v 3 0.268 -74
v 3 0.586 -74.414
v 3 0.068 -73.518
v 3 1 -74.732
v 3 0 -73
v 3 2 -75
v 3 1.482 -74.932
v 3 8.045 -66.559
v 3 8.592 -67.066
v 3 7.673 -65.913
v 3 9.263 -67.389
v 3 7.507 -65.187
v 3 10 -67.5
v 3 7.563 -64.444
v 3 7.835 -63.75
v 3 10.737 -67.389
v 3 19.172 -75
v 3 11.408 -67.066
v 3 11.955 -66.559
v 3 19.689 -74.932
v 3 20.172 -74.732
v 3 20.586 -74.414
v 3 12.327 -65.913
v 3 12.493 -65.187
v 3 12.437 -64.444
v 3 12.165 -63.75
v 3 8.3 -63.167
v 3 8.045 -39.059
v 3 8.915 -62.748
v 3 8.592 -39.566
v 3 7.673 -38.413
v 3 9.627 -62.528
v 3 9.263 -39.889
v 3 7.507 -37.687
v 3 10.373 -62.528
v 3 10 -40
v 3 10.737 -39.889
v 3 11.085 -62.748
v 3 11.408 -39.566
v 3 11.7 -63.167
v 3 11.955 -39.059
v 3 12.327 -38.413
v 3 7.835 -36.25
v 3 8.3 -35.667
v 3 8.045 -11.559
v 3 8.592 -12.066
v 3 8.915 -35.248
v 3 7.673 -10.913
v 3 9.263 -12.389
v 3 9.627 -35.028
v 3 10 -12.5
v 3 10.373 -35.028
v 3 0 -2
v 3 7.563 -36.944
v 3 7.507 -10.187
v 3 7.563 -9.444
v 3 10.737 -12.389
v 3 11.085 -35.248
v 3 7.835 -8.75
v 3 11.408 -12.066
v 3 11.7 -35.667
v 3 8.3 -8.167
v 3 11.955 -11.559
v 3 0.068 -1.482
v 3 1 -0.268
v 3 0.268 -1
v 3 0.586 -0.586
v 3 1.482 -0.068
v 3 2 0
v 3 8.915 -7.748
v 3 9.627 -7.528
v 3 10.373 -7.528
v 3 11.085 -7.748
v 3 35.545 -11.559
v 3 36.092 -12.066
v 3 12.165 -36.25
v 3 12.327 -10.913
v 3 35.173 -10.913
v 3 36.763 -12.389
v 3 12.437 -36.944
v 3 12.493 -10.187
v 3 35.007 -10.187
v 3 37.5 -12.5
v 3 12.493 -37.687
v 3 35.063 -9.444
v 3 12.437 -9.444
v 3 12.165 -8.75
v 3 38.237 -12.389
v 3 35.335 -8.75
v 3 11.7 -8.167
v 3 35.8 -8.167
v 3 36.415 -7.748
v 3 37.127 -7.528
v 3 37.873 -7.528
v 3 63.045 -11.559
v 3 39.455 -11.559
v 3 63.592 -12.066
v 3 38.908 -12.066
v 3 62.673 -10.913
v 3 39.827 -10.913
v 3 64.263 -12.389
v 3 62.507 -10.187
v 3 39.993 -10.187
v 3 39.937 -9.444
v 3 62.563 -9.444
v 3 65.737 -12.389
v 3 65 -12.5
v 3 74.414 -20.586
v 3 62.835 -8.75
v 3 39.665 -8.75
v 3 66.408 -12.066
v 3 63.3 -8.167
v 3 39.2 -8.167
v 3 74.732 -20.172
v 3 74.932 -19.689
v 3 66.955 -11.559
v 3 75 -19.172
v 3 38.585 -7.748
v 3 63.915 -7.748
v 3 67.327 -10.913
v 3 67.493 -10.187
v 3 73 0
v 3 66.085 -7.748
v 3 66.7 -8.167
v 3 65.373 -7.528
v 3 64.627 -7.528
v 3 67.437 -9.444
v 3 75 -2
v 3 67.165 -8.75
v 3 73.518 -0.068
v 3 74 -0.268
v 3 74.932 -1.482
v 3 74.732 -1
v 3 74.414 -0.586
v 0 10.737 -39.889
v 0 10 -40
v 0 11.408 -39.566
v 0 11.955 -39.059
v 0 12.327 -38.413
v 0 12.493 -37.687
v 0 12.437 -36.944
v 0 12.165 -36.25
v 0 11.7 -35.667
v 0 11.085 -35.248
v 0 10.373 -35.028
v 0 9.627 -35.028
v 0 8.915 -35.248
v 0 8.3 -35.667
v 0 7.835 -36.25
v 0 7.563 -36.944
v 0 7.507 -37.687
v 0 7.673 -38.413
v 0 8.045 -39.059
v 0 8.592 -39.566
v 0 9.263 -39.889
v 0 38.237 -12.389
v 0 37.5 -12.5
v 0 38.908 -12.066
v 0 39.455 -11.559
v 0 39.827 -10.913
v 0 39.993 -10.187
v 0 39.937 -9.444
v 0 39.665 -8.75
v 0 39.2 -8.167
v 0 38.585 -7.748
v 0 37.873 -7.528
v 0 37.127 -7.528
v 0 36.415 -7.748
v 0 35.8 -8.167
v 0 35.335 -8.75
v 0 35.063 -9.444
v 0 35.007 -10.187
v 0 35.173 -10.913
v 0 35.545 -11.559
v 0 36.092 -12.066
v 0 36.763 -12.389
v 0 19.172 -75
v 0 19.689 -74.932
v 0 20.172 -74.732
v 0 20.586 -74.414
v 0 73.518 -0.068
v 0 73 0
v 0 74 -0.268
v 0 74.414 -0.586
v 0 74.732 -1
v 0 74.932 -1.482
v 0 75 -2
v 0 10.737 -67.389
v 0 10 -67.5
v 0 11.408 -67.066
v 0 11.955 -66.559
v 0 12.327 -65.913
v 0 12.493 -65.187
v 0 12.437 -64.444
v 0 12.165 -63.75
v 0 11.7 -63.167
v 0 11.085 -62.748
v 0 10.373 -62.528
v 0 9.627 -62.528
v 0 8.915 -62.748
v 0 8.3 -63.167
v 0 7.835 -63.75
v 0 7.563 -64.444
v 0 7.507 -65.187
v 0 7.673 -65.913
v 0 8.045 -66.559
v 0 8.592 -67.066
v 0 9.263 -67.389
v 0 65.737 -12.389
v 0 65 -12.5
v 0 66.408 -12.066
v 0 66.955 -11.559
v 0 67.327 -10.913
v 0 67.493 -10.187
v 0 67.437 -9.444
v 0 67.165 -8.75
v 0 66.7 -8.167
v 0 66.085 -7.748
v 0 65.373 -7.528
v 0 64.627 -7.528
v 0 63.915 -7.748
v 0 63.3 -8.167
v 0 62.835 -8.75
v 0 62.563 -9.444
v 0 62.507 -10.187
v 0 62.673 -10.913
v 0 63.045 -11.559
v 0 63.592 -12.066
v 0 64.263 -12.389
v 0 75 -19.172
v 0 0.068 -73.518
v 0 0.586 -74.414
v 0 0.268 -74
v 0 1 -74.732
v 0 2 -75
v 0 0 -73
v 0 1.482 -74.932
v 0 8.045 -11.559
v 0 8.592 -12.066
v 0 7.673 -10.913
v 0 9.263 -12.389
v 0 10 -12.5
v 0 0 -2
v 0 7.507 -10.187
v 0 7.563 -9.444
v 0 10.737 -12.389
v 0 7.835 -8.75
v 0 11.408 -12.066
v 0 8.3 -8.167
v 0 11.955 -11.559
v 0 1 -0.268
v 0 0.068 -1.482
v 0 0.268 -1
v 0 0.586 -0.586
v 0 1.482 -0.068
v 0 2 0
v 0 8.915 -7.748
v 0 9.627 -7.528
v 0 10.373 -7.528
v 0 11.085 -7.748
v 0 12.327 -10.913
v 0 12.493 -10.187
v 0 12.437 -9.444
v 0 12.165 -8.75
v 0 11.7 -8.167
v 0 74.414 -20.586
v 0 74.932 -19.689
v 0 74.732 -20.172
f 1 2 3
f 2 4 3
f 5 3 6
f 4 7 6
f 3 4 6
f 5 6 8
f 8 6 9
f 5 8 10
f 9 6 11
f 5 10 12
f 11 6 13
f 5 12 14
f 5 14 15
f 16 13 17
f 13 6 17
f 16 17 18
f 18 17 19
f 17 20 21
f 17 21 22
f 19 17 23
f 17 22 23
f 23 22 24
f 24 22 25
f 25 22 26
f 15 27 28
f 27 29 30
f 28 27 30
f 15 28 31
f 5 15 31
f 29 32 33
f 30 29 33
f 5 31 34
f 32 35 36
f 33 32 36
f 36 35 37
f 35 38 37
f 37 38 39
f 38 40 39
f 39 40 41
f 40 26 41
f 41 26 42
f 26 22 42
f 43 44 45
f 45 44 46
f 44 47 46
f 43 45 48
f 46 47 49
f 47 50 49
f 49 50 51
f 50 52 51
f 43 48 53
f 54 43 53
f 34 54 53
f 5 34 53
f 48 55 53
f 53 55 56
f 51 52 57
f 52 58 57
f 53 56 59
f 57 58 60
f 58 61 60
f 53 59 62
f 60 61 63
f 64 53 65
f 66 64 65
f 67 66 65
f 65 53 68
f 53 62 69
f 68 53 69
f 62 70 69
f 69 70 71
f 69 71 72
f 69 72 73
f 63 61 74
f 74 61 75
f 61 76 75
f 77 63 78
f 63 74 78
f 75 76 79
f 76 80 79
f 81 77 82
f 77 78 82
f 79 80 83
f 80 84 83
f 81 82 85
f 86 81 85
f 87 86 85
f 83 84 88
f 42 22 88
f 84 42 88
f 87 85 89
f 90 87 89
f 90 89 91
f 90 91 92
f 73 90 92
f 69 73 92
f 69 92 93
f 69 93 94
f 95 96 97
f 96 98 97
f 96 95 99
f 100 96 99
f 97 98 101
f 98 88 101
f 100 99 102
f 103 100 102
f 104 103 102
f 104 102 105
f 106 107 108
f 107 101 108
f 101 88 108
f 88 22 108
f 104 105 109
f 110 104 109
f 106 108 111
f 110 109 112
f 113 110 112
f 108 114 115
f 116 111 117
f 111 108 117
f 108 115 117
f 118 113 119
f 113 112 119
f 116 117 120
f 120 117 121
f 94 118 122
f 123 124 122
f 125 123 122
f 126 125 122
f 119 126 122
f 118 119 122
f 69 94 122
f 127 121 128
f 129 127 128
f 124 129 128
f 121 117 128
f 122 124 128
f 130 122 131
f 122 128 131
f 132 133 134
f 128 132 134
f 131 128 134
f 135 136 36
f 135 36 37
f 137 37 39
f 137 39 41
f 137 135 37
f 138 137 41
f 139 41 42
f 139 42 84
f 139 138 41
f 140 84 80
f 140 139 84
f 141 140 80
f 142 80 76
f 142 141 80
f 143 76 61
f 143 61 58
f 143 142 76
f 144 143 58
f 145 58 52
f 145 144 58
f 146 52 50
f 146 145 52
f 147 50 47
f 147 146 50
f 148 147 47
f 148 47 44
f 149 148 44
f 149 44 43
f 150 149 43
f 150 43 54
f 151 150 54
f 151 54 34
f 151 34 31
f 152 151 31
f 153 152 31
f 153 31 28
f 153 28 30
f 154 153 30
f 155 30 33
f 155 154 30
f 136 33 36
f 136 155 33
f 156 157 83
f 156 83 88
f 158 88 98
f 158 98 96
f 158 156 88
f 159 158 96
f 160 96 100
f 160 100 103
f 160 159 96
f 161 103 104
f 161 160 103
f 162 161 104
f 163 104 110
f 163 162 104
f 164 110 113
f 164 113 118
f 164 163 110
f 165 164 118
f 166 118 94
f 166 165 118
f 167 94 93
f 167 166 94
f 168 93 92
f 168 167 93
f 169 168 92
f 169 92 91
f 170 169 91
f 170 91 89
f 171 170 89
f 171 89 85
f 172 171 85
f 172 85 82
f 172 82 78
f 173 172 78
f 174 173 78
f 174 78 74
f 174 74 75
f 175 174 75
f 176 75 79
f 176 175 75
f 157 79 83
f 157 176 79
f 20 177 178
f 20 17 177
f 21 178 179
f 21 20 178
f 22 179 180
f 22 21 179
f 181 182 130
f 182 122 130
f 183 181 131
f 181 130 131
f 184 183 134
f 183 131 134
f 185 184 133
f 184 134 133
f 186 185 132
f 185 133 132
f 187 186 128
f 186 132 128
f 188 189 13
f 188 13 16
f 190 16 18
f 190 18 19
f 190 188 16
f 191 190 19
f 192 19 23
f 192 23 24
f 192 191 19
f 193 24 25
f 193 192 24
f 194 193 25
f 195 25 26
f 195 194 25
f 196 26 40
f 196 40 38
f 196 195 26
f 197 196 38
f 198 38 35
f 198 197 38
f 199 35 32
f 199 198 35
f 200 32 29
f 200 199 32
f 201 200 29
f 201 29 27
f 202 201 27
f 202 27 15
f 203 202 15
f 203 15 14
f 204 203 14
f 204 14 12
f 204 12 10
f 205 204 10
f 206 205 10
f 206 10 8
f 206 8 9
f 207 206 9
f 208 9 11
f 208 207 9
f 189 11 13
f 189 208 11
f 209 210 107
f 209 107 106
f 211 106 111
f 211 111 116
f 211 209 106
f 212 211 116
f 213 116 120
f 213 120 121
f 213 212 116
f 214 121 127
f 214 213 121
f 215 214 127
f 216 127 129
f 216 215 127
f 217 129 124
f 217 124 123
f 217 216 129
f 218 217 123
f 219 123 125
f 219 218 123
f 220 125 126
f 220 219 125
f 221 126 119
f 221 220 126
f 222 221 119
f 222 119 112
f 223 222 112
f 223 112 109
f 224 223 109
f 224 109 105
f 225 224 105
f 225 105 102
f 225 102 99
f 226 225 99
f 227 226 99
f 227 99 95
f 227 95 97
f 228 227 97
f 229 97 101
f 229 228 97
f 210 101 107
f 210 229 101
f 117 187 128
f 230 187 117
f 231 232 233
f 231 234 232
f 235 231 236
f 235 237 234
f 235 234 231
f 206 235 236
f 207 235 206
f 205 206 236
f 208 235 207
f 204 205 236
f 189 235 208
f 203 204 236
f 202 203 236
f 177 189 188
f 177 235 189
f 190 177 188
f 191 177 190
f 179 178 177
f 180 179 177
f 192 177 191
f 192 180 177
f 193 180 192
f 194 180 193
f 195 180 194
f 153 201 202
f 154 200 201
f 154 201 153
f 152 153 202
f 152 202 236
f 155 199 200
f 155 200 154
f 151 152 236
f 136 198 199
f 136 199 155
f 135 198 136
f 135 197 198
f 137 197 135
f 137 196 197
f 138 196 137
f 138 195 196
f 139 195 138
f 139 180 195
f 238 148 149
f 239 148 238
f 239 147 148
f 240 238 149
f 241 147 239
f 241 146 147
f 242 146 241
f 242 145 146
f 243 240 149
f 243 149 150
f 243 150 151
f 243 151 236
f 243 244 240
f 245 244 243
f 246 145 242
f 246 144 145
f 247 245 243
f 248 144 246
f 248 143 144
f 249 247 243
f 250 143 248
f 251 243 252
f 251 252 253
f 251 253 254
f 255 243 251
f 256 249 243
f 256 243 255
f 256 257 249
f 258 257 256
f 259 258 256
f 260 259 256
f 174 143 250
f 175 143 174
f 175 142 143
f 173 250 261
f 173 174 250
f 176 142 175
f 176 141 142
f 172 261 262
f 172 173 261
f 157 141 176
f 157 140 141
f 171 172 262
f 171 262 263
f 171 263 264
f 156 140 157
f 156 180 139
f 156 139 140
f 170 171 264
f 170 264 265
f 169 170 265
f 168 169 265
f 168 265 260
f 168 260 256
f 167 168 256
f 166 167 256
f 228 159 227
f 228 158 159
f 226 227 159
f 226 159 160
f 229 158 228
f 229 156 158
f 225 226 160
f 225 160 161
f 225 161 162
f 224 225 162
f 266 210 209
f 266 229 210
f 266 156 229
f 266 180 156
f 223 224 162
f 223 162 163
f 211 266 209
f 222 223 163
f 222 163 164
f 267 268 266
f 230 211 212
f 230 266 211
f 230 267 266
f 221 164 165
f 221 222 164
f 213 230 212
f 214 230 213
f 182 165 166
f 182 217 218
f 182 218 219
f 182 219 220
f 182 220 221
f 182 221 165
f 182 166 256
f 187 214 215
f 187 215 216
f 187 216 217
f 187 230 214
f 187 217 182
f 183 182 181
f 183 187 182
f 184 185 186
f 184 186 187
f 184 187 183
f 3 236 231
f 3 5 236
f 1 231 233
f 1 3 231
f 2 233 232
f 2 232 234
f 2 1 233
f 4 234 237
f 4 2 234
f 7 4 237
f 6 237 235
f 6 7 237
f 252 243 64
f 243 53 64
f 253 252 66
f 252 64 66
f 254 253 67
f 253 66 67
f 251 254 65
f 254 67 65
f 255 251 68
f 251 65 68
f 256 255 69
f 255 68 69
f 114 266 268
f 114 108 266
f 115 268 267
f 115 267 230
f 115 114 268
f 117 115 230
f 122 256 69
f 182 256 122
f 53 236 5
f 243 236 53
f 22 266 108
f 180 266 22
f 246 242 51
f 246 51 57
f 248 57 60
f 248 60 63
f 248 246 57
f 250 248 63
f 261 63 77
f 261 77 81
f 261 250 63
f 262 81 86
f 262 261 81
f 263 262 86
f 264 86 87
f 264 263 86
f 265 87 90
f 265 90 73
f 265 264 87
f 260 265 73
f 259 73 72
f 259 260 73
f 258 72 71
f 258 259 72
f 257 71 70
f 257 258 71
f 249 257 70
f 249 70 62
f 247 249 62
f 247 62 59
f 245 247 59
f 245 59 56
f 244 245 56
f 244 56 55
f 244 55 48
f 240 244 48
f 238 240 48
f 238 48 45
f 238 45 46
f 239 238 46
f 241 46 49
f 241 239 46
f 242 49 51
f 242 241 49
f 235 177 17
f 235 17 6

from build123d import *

# Parameters (mm, degrees)
SKETCH1_R           = 2.5
BOSS_EXTRUDE1_DEPTH = 3
FILLET1_R           = 2


with BuildPart() as part:
    # Sketch1 → Boss-Extrude1 (new body)
    with BuildSketch(Plane(origin=(0, 0, 0), x_dir=(0, 0, -1), z_dir=(1, 0, 0))):
        Polygon((75, 0), (0, 0), (0, 75), (20, 75), (75, 20), align=None)
        with Locations((65, 10)):
            Circle(SKETCH1_R, mode=Mode.SUBTRACT)
        with Locations((37.5, 10)):
            Circle(SKETCH1_R, mode=Mode.SUBTRACT)
        with Locations((10, 10)):
            Circle(SKETCH1_R, mode=Mode.SUBTRACT)
        with Locations((10, 65)):
            Circle(SKETCH1_R, mode=Mode.SUBTRACT)
        with Locations((10, 37.5)):
            Circle(SKETCH1_R, mode=Mode.SUBTRACT)
    extrude(amount=BOSS_EXTRUDE1_DEPTH)

    # Fillet1
    fillet1_edges = [part.edges().sort_by_distance(p)[0] for p in [
        (1.5, 0, -75),
        (1.5, 0, 0),
        (1.5, 75, 0),
        (1.5, 75, -20),
        (1.5, 20, -75),
    ]]
    fillet(fillet1_edges, radius=FILLET1_R)


solid = part.part
